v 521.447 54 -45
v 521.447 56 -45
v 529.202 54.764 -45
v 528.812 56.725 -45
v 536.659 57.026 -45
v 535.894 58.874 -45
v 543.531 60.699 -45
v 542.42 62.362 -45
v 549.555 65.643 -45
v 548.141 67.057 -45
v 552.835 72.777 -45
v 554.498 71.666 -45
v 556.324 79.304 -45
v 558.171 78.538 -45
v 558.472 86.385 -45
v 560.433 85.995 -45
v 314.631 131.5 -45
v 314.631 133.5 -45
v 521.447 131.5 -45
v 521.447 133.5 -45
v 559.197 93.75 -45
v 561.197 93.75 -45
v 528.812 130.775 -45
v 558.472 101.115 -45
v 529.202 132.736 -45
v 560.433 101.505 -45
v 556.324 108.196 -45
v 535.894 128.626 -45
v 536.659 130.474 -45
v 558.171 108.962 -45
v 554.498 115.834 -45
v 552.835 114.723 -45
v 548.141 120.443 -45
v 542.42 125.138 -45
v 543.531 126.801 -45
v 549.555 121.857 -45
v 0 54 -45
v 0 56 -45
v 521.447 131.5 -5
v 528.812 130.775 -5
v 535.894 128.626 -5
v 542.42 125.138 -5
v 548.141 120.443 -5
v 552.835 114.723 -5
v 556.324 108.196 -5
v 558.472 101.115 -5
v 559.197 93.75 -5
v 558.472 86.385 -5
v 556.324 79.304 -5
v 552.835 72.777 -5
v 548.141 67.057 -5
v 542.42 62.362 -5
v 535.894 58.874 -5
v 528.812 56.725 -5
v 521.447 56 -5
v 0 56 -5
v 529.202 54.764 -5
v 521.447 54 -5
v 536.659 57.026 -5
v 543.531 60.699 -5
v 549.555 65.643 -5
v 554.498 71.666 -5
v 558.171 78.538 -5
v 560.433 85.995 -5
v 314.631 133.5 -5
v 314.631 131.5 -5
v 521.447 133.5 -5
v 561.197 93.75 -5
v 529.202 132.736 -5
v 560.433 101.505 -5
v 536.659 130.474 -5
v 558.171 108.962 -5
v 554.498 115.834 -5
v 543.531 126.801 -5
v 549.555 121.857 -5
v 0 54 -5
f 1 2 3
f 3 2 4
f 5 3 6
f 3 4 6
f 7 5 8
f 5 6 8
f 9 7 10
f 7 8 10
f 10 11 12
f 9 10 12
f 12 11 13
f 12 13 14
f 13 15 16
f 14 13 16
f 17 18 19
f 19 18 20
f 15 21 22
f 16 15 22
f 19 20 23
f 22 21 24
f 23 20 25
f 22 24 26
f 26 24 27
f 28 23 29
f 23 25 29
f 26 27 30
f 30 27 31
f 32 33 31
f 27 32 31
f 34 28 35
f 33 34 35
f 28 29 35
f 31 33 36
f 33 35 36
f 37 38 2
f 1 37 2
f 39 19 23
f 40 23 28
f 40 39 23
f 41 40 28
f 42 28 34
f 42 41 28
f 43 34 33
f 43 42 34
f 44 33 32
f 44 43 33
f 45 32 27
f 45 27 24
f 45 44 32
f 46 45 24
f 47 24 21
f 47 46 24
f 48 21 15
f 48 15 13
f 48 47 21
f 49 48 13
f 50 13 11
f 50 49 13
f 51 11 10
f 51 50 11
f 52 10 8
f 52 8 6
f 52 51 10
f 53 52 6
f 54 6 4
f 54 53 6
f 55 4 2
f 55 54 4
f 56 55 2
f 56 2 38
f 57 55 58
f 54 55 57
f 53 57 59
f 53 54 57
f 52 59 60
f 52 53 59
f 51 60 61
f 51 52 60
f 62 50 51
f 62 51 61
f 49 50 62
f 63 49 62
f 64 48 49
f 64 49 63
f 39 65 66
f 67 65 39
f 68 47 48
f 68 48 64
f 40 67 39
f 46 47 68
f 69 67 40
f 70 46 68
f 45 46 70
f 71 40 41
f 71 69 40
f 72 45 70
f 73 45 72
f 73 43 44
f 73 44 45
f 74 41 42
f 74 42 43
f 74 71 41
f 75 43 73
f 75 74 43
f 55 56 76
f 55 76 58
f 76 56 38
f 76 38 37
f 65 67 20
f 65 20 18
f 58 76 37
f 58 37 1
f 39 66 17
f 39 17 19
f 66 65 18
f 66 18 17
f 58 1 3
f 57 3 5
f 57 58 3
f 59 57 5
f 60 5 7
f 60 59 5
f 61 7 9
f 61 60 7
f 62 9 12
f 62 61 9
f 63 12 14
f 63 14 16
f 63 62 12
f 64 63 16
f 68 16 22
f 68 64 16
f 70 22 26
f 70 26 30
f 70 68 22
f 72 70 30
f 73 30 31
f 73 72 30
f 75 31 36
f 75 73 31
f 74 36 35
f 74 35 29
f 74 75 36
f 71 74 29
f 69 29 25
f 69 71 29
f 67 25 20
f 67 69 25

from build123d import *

# Parameters (mm, degrees)
EXTRUDE_THIN1_START = -5
EXTRUDE_THIN1_DEPTH = 40


with BuildPart() as part:
    # Sketch1 → Extrude-Thin1 (new body)
    with BuildSketch(Plane.XY.offset(EXTRUDE_THIN1_START)):
        with BuildLine():
            Line((0, 54), (521.447237603, 54))
            ThreePointArc((521.447237603, 54), (561.197237603, 93.75), (521.447237603, 133.5))
            Line((521.447237603, 133.5), (314.631190532, 133.5))
            Line((314.631190532, 133.5), (314.631190532, 131.5))
            Line((314.631190532, 131.5), (521.447237603, 131.5))
            ThreePointArc((521.447237603, 131.5), (559.197237603, 93.75), (521.447237603, 56))
            Line((521.447237603, 56), (0, 56))
            Line((0, 56), (0, 54))
        make_face()
    extrude(amount=-EXTRUDE_THIN1_DEPTH)


solid = part.part
